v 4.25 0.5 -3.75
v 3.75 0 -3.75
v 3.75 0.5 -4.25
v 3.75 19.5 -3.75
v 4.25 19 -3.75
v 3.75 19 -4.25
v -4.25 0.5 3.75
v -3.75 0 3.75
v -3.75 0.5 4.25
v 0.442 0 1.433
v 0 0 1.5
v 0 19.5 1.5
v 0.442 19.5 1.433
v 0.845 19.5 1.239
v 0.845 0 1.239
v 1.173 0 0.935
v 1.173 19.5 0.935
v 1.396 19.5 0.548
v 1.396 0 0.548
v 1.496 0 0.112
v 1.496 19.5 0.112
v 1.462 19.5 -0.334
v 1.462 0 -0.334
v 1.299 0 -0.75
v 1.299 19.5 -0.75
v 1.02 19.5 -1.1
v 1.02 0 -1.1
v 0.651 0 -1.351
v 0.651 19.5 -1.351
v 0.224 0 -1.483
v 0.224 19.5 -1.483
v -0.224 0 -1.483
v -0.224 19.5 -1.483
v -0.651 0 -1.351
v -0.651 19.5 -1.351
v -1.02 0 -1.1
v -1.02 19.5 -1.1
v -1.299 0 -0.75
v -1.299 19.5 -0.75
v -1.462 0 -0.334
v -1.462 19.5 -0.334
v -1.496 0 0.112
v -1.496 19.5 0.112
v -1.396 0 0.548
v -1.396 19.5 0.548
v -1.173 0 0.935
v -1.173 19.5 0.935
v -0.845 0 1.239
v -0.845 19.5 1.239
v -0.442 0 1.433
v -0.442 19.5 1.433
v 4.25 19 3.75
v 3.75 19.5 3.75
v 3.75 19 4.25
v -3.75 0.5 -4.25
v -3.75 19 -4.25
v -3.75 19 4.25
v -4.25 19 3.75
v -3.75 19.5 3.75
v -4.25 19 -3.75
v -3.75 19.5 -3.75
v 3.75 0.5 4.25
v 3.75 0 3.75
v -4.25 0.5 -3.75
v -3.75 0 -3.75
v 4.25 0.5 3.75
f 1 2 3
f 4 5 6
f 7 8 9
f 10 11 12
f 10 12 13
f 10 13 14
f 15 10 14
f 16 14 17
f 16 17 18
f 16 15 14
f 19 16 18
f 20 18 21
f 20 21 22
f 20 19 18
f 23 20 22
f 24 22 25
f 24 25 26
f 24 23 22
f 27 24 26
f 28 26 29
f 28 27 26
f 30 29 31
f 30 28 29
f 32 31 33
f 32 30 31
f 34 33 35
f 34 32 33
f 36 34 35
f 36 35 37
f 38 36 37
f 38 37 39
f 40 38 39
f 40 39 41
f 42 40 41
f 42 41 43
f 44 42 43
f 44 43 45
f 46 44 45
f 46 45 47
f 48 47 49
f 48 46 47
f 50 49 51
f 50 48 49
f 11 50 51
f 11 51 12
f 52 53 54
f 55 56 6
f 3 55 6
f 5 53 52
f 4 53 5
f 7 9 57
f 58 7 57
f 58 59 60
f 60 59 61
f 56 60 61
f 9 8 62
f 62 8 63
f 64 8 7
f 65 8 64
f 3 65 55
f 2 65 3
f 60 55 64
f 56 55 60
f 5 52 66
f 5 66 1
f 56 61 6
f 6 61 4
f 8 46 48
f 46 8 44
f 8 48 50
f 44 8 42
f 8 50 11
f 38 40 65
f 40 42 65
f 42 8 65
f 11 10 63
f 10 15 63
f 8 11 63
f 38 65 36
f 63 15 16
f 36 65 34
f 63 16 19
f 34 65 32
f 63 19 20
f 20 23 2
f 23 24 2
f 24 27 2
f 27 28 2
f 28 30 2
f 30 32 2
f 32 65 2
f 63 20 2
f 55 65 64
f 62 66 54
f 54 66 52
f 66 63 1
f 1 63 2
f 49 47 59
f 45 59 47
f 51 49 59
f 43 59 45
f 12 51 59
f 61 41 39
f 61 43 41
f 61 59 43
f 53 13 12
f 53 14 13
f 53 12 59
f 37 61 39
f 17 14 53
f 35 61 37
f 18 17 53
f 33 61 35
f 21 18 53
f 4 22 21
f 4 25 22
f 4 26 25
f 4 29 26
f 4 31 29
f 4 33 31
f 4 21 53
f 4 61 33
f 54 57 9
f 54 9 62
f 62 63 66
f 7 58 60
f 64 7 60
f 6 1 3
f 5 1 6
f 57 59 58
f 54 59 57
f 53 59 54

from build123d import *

# Parameters (mm, degrees)
SKETCH1_W           = 8.5
SKETCH1_H           = 8.5
SKETCH1_R           = 1.5
BOSS_EXTRUDE1_DEPTH = 19.5
CHAMFER1_SIZE       = 0.5


with BuildPart() as part:
    # Sketch1 → Boss-Extrude1 (new body)
    with BuildSketch(Plane(origin=(0, 0, 0), x_dir=(1, 0, 0), z_dir=(0, 1, 0))):
        Rectangle(SKETCH1_W, SKETCH1_H)
        with Locations(Location((0, 0, 0), (0, 0, 270))):
            Circle(SKETCH1_R, mode=Mode.SUBTRACT)
    extrude(amount=BOSS_EXTRUDE1_DEPTH)

    # Chamfer1
    chamfer1_edges = [part.edges().sort_by_distance(p)[0] for p in [
        (-4.25, 19.5, 0),
        (0, 19.5, 4.25),
        (4.25, 19.5, 0),
        (0, 0, 4.25),
        (-4.25, 0, 0),
        (0, 0, -4.25),
        (4.25, 0, 0),
        (4.25, 9.75, 4.25),
        (-4.25, 9.75, 4.25),
        (-4.25, 9.75, -4.25),
        (4.25, 9.75, -4.25),
        (0, 19.5, -4.25),
    ]]
    chamfer(chamfer1_edges, length=CHAMFER1_SIZE)


solid = part.part
